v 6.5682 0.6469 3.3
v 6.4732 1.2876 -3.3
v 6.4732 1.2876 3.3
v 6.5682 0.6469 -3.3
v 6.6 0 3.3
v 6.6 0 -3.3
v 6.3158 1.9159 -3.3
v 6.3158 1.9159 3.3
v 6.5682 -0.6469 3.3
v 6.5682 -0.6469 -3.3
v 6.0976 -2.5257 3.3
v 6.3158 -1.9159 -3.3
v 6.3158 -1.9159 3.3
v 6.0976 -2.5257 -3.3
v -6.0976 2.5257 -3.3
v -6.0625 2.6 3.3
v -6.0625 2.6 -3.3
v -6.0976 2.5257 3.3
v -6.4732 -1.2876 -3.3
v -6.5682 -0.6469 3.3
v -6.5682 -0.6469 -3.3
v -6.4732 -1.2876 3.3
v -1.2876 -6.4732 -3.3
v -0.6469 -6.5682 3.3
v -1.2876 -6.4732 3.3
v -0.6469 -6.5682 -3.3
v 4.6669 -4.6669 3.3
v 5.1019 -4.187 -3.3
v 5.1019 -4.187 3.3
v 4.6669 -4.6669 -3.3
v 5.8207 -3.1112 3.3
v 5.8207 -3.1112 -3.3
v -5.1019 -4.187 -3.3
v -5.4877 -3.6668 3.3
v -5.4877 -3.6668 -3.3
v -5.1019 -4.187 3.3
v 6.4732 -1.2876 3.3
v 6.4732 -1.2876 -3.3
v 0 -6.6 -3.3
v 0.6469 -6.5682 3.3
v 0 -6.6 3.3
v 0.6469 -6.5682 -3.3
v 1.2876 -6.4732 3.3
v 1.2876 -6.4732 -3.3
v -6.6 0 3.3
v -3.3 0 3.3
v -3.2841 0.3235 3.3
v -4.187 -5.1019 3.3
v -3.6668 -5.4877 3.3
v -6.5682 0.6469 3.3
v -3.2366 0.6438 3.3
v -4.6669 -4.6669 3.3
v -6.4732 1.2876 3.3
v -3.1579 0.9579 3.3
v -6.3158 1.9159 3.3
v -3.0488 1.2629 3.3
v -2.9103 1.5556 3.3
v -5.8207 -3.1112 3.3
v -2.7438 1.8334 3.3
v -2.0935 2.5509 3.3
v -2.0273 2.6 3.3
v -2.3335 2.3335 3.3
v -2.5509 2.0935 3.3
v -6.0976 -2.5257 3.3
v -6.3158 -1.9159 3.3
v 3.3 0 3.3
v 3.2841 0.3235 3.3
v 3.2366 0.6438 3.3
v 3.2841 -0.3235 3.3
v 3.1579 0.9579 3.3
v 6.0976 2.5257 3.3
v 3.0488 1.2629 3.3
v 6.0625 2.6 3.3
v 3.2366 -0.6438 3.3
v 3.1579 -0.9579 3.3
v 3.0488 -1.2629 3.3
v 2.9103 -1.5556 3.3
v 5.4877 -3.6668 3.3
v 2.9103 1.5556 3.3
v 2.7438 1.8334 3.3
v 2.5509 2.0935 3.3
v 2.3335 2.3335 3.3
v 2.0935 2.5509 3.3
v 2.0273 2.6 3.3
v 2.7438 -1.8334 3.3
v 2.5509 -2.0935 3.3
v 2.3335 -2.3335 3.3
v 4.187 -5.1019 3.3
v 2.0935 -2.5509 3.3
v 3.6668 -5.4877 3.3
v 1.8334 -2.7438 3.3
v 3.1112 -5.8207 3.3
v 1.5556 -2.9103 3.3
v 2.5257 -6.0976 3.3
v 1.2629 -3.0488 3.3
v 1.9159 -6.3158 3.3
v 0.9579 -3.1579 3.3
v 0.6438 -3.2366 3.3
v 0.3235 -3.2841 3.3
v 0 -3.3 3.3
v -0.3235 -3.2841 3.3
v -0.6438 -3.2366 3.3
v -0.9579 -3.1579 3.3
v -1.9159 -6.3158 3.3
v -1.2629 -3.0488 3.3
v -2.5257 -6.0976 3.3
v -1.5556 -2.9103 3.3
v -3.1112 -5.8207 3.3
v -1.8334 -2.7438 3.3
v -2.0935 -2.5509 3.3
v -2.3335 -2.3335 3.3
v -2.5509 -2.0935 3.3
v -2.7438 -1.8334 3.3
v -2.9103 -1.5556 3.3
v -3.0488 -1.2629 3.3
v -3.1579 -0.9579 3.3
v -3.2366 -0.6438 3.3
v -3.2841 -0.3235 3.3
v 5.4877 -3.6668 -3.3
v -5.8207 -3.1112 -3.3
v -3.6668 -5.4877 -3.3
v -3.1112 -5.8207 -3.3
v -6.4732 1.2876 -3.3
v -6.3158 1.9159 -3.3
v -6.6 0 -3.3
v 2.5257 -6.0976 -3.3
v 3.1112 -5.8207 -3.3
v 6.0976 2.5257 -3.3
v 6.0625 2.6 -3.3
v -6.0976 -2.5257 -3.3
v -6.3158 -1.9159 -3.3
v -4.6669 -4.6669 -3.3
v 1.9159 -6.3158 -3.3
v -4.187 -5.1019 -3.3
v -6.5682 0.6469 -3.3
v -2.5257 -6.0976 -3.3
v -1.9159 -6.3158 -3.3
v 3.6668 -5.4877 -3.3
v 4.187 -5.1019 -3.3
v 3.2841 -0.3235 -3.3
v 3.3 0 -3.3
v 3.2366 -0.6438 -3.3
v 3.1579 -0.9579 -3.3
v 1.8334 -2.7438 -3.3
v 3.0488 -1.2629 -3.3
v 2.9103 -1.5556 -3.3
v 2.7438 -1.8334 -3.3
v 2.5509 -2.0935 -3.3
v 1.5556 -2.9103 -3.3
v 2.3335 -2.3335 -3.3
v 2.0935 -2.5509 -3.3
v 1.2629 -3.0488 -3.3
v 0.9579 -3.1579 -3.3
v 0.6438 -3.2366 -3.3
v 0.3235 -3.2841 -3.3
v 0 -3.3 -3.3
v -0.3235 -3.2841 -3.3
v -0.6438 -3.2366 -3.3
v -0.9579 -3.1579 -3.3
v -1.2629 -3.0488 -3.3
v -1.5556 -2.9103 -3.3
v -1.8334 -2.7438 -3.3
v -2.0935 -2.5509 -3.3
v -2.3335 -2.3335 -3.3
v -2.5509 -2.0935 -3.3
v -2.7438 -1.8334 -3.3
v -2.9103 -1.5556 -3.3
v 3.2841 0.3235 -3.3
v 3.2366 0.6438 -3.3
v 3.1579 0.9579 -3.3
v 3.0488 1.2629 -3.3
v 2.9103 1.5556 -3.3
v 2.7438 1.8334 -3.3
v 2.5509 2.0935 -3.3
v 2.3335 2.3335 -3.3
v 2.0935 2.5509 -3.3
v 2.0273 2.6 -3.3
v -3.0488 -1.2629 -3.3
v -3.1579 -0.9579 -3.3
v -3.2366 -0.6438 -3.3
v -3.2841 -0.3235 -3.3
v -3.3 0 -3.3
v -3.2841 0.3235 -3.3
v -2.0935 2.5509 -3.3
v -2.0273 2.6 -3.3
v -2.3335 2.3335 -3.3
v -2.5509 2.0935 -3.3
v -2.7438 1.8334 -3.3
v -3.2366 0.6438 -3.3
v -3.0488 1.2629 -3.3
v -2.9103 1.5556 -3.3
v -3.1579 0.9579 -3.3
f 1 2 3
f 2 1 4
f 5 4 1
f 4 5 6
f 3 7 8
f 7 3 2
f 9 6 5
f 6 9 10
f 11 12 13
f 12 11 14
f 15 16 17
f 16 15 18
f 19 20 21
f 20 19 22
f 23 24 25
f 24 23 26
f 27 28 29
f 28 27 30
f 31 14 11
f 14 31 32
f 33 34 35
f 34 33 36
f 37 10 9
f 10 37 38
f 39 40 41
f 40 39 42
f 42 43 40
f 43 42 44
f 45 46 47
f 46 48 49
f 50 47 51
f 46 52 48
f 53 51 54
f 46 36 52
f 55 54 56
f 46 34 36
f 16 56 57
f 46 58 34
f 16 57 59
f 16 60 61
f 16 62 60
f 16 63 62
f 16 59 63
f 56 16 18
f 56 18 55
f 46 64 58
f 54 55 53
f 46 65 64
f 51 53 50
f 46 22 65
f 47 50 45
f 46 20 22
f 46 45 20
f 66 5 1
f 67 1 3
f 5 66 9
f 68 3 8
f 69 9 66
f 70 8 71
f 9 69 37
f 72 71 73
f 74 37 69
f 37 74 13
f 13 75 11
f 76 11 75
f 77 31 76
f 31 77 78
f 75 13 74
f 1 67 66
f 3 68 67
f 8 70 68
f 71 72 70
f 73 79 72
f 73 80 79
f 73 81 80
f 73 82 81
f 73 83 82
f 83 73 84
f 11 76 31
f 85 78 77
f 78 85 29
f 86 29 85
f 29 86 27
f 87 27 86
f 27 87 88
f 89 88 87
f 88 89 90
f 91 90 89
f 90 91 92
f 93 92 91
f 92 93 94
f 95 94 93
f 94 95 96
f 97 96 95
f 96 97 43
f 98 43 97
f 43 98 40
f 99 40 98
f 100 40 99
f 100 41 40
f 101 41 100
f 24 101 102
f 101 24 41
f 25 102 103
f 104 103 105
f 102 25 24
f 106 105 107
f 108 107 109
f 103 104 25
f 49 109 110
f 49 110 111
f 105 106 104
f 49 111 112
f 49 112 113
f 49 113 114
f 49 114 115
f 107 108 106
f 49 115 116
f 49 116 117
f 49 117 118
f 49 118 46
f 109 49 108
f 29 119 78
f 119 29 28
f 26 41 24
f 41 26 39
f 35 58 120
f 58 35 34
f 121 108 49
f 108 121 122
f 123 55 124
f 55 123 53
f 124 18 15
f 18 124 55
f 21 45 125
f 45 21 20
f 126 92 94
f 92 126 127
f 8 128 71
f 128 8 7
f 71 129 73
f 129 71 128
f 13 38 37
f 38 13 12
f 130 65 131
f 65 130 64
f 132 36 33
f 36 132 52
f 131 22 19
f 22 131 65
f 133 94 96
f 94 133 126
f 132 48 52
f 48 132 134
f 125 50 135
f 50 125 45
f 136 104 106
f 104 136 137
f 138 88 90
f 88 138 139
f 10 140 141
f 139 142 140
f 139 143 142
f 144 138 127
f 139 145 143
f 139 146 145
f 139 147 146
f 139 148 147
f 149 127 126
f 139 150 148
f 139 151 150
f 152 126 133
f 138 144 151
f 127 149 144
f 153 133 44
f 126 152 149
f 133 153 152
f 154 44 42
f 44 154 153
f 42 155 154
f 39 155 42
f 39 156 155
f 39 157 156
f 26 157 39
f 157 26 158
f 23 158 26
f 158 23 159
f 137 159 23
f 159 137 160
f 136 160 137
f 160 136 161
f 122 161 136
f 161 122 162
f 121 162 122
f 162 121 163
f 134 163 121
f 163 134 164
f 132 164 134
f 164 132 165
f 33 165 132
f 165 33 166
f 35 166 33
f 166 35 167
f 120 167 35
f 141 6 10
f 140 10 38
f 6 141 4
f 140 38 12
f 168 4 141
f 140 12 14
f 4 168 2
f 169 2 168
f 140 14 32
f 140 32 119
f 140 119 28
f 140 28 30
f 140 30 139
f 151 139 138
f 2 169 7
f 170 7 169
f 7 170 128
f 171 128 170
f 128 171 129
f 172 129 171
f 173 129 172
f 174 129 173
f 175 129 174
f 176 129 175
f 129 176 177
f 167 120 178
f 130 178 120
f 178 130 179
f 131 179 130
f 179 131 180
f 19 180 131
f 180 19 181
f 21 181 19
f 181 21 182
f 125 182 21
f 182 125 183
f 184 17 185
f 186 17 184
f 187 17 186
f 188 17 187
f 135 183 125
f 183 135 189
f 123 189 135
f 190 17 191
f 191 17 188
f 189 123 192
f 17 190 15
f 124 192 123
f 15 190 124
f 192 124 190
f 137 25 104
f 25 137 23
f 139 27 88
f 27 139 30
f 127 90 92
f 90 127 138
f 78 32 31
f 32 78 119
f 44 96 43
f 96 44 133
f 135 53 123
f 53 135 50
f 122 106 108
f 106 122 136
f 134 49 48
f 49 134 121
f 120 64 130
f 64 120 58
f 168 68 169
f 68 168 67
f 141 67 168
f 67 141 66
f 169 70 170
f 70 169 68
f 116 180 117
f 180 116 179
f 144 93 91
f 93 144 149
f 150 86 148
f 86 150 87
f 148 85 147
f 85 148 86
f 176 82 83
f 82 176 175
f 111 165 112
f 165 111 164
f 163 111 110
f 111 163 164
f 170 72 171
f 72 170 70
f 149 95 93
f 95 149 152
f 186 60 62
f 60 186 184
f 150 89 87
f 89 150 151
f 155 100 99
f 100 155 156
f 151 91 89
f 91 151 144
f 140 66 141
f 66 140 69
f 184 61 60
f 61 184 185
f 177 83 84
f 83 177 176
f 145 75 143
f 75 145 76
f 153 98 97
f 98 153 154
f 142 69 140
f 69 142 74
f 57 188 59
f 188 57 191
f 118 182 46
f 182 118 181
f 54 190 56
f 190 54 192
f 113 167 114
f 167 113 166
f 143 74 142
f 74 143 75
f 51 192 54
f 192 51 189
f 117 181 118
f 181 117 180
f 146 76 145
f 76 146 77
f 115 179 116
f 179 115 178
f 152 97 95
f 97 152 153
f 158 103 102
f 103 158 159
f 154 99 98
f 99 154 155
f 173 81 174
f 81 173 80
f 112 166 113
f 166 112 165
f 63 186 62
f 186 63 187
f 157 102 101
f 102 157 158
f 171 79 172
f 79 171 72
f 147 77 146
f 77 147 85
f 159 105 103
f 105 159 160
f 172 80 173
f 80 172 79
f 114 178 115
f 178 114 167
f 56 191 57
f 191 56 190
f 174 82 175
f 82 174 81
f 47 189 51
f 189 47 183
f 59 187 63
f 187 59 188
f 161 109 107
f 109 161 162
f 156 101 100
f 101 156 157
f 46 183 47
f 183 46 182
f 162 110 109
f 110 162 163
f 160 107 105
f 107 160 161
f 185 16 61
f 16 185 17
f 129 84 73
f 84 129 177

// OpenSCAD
// COBRA Vertebra - T3 V9
// Height: 6.6000000000000005mm, OD: 13.200000000000001mm

$fn = 64;

difference() {
    // Outer cylinder
    cylinder(h=6.6000000000000005, d=13.200000000000001, center=true);
    
    // Inner channel
    cylinder(h=8.600000000000001, d=6.6000000000000005, center=true);

    // Solar panel cavity
    translate([0, 4.6000000000000005, 0])
    cube([50, 4, 30], center=true);

    // Pivot holes
    translate([0, 6.6000000000000005, 0.30000000000000027])
    rotate([90, 0, 0])
    cylinder(h=5.300000000000001, d=4, center=true);
    
    translate([0, 6.6000000000000005, -0.30000000000000027])
    rotate([90, 0, 0])
    cylinder(h=5.300000000000001, d=4, center=true);
}
